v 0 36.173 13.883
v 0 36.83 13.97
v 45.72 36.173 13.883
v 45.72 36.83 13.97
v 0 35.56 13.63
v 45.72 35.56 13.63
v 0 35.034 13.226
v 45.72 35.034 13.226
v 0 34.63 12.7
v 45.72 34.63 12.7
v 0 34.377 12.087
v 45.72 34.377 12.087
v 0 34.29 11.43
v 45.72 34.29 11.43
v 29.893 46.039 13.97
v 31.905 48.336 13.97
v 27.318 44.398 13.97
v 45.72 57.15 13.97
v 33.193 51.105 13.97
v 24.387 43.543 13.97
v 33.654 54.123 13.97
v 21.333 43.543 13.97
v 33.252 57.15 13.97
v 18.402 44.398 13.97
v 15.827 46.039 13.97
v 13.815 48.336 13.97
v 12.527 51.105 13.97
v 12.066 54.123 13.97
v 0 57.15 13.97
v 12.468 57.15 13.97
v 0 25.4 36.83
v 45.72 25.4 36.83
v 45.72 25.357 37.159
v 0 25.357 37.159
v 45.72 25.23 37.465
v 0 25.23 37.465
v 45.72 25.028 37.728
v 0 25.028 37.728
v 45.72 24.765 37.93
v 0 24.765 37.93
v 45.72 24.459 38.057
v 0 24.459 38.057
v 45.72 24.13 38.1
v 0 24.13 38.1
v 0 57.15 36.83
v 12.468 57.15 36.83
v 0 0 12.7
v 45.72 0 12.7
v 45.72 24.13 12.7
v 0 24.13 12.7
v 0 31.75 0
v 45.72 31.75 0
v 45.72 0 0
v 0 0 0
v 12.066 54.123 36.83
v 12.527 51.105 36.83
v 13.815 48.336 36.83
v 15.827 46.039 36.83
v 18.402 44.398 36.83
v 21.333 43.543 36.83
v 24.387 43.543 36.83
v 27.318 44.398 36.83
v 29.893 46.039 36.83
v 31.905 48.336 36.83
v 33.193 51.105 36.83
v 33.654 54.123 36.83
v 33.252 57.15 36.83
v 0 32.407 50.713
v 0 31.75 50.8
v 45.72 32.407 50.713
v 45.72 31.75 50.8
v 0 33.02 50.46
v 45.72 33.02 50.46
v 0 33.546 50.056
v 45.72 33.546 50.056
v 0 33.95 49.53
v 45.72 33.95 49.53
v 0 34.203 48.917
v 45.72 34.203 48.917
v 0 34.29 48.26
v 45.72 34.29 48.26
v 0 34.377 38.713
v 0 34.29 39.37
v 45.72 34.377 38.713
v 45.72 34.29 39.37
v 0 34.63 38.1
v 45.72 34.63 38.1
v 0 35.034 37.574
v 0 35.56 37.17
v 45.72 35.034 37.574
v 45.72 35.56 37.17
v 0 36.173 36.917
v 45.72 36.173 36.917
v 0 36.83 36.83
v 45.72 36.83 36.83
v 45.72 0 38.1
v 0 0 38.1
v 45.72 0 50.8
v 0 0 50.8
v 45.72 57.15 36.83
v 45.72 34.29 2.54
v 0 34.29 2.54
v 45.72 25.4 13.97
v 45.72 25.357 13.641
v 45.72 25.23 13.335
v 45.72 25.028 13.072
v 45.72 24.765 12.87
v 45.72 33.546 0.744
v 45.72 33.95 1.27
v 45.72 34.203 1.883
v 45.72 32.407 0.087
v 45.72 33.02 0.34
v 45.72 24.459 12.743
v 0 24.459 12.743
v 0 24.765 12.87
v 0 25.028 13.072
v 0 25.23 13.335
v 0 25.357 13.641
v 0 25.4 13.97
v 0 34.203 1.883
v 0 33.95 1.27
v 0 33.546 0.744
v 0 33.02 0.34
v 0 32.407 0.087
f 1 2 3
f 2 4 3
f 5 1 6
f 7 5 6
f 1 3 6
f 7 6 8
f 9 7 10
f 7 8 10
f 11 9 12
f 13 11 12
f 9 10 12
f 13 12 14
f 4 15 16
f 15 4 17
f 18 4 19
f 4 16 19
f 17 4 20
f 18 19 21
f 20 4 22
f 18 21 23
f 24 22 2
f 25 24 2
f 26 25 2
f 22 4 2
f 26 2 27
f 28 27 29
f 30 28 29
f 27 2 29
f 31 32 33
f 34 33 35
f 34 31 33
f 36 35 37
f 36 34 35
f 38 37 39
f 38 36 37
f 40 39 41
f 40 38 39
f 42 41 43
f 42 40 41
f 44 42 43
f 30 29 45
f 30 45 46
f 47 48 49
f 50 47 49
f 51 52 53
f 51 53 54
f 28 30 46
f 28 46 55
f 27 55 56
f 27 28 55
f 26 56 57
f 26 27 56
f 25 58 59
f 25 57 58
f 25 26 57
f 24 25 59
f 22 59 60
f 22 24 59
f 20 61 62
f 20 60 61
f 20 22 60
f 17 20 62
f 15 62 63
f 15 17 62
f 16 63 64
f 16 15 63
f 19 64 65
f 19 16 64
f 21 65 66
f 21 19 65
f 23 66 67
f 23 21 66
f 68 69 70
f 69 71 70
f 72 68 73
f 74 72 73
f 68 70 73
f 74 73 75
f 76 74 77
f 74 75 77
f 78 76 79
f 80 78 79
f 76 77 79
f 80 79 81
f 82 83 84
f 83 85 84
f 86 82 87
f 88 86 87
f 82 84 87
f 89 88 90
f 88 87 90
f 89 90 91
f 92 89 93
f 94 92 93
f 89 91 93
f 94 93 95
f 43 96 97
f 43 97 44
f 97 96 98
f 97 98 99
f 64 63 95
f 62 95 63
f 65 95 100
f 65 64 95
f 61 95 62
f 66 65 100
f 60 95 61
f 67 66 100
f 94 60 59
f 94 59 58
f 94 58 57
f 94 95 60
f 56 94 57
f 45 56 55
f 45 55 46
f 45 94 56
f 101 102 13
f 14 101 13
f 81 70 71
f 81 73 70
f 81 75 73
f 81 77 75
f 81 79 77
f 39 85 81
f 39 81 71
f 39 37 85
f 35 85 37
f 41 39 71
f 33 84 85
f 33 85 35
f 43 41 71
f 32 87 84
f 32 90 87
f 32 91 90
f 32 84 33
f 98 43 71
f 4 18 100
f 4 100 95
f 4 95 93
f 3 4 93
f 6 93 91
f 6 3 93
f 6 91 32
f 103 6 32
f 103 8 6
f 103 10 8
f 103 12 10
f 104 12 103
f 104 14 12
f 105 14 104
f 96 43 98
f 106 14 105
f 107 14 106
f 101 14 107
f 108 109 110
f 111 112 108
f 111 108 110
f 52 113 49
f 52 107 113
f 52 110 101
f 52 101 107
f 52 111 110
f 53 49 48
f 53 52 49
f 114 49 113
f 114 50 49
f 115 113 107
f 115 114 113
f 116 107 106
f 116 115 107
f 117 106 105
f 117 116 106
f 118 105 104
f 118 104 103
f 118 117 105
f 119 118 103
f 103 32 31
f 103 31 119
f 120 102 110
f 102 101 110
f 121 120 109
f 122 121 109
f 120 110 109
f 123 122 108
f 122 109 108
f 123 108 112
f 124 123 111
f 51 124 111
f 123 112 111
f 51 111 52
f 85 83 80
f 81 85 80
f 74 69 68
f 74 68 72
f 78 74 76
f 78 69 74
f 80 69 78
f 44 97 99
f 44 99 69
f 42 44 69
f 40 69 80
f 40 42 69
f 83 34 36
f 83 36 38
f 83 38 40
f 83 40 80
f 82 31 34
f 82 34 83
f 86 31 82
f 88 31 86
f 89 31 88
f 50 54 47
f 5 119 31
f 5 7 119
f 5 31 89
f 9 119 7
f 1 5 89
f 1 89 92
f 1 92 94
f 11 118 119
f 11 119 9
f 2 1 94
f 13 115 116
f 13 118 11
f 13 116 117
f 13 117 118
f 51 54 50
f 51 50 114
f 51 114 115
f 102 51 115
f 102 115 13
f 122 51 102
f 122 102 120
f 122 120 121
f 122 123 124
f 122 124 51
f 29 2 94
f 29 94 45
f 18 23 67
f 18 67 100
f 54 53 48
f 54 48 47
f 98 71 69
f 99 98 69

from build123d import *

# Parameters (mm, degrees)
BOSS_EXTRUDE1_DEPTH = 50.8
SKETCH2_W           = 25.4
SKETCH2_H           = 25.4
CUT_EXTRUDE1_DEPTH  = 90.090296329
FILLET1_R           = 1.27
SKETCH4_W           = 13.97
SKETCH4_H           = 22.86
CUT_EXTRUDE2_DEPTH  = 90.090296329
FILLET2_R           = 2.54


with BuildPart() as part:
    # Sketch1 → Boss-Extrude1 (new body)
    with BuildSketch(Plane.XY):
        with BuildLine():
            Line((33.252294453, 57.15), (45.72, 57.15))
            Line((45.72, 57.15), (45.72, 0))
            Line((45.72, 0), (0, 0))
            Line((0, 0), (0, 57.15))
            Line((0, 57.15), (12.467705547, 57.15))
            ThreePointArc((12.467705547, 57.15), (22.86, 43.434), (33.252294453, 57.15))
        make_face()
    extrude(amount=BOSS_EXTRUDE1_DEPTH)

    # Sketch2 → Cut-Extrude1 (cut, through all)
    with BuildSketch(Plane(origin=(45.72, 0, 0), x_dir=(0, 0, -1), z_dir=(1, 0, 0))):
        with Locations((-25.4, 12.7)):
            Rectangle(SKETCH2_W, SKETCH2_H)
    extrude(amount=-CUT_EXTRUDE1_DEPTH, mode=Mode.SUBTRACT)

    # Fillet1
    fillet1_edges = [part.edges().sort_by_distance(p)[0] for p in [
        (22.86, 25.4, 38.1),
        (22.86, 25.4, 12.7),
    ]]
    fillet(fillet1_edges, radius=FILLET1_R)

    # Sketch4 → Cut-Extrude2 (cut, through all)
    with BuildSketch(Plane.ZY):
        with Locations((43.815, 45.72)):
            Rectangle(SKETCH4_W, SKETCH4_H)
        with Locations((6.985, 45.72)):
            Rectangle(SKETCH4_W, SKETCH4_H)
    extrude(amount=-CUT_EXTRUDE2_DEPTH, mode=Mode.SUBTRACT)

    # Fillet2
    fillet2_edges = [part.edges().sort_by_distance(p)[0] for p in [
        (22.86, 34.29, 36.83),
        (22.86, 34.29, 50.8),
        (22.86, 34.29, 0),
        (22.86, 34.29, 13.97),
    ]]
    fillet(fillet2_edges, radius=FILLET2_R)


solid = part.part
